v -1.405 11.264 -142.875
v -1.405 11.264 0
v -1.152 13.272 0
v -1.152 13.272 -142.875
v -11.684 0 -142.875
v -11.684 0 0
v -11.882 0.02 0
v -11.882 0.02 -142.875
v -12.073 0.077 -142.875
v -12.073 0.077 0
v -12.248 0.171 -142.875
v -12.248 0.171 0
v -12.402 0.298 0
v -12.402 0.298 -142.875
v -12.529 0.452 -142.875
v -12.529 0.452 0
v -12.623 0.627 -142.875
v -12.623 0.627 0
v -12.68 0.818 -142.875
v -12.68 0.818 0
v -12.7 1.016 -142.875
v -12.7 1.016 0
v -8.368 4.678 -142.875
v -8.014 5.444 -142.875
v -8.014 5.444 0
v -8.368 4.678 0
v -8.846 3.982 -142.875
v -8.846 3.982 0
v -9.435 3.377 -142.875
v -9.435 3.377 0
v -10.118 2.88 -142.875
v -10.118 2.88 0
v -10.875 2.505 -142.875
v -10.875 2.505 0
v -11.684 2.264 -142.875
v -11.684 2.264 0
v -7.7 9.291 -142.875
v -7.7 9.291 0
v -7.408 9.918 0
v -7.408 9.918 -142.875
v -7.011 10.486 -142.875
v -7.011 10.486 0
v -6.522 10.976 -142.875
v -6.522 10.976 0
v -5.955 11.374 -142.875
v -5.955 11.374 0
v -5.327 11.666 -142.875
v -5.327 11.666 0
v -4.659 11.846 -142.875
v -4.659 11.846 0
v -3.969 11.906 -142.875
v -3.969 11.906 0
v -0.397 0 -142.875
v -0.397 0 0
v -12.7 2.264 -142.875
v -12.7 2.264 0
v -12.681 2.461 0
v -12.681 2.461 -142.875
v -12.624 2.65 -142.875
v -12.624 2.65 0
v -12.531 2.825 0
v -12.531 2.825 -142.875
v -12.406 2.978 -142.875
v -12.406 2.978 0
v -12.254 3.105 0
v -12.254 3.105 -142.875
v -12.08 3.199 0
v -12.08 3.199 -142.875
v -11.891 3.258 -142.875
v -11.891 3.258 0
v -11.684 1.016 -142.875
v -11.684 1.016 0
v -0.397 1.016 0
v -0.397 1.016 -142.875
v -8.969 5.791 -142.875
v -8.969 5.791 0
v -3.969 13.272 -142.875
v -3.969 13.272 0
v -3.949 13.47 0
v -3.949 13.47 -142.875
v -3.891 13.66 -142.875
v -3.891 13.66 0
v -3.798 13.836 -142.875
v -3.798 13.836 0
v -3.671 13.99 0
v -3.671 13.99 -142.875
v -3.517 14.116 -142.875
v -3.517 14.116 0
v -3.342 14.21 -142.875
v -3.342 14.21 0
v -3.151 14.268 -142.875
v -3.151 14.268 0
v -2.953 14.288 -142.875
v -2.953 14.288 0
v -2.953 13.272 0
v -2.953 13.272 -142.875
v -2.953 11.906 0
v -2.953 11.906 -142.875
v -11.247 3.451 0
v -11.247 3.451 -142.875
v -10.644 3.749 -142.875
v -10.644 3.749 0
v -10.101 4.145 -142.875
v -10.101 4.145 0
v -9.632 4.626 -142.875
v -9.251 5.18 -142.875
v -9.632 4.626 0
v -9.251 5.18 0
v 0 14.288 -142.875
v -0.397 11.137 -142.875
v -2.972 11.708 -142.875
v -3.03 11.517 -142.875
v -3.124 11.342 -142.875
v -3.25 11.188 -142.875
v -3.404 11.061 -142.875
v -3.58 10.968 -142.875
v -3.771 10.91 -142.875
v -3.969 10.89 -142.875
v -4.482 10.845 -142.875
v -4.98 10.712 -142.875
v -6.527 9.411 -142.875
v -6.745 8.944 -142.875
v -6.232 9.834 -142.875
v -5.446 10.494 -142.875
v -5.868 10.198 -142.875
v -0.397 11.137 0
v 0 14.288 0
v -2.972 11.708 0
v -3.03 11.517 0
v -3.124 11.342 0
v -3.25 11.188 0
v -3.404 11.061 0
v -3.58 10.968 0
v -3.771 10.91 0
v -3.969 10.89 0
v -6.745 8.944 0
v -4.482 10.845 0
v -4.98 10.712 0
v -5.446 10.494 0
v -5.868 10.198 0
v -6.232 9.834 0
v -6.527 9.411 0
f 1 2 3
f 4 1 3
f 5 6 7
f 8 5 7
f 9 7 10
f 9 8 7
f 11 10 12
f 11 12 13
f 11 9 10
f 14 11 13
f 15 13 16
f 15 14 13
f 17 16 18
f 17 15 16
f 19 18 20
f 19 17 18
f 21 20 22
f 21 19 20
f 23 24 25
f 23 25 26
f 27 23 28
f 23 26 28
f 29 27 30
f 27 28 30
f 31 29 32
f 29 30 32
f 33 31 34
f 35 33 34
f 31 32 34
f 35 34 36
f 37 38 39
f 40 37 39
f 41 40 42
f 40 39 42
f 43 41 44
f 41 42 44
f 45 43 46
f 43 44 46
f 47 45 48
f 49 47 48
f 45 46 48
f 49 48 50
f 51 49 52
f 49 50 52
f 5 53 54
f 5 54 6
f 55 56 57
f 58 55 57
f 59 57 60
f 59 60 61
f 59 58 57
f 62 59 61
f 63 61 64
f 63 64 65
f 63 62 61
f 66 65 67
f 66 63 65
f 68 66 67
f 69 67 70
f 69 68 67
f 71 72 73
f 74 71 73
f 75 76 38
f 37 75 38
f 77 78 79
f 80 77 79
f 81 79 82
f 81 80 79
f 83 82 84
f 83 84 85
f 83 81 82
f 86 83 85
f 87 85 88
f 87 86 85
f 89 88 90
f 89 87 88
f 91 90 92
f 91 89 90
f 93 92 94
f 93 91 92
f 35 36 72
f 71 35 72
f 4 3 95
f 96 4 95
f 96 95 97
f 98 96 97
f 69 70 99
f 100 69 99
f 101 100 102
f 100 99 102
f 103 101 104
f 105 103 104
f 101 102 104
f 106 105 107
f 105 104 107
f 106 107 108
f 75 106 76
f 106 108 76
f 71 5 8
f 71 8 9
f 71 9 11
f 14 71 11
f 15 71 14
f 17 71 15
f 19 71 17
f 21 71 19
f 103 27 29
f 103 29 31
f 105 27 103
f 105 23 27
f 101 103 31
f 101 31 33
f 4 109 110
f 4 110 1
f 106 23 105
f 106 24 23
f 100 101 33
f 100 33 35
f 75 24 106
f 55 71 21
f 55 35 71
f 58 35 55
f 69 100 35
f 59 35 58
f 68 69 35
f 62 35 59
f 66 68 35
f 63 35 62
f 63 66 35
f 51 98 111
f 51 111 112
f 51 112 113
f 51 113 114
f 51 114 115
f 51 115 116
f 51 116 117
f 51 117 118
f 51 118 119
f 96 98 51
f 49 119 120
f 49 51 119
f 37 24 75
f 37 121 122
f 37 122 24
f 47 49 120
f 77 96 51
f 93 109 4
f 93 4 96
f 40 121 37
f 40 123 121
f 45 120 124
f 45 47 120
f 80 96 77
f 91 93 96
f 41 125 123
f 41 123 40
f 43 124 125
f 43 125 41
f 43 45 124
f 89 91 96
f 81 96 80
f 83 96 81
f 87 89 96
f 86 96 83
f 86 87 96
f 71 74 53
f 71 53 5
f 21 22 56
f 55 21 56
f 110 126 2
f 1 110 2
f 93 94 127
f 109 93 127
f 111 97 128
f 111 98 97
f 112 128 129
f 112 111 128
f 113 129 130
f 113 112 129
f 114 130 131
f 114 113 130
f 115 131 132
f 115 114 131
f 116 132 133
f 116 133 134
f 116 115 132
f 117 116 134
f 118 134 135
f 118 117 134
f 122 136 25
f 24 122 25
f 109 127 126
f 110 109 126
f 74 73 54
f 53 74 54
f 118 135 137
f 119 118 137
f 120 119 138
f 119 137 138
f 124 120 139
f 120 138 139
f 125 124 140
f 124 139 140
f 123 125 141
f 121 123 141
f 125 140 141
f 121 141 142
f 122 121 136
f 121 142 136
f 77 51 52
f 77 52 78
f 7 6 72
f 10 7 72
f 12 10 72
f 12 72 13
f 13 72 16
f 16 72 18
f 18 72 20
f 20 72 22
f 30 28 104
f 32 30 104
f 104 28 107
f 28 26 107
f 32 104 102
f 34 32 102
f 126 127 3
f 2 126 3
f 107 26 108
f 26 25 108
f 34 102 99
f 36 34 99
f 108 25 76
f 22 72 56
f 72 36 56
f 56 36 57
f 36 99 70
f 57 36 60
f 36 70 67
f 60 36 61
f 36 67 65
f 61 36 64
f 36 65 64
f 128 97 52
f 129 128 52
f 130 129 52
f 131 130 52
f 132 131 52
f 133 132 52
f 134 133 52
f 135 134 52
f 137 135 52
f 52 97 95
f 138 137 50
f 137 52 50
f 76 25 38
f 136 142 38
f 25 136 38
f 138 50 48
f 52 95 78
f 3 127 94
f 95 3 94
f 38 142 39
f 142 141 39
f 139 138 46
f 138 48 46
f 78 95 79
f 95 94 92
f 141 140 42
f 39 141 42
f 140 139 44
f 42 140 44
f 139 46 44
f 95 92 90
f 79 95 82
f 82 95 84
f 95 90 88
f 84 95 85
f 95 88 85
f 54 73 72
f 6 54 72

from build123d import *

# Parameters (mm, degrees)
EXTRUDE_THIN1_DEPTH = 142.875
FILLET1_R           = 1.016


with BuildPart() as part:
    # Sketch1 → Extrude-Thin1 (new body)
    with BuildSketch(Plane.XY):
        with BuildLine():
            Line((-0.396875, 0), (-12.7, 0))
            Line((-12.7, 0), (-12.7, 3.175))
            ThreePointArc((-12.7, 3.175), (-10.421749313, 3.894049957), (-8.969036168, 5.790647844))
            Line((-8.969036168, 5.790647844), (-7.699713832, 9.290602156))
            ThreePointArc((-7.699713832, 9.290602156), (-6.247000687, 11.187200043), (-3.96875, 11.90625))
            Line((-3.96875, 11.90625), (-3.96875, 14.2875))
            Line((-3.96875, 14.2875), (0, 14.2875))
            Line((0, 14.2875), (-0.396875, 11.137402345))
            Line((-0.396875, 11.137402345), (-1.40490625, 11.264402345))
            Line((-1.40490625, 11.264402345), (-1.152035714, 13.2715))
            Line((-1.152035714, 13.2715), (-2.95275, 13.2715))
            Line((-2.95275, 13.2715), (-2.95275, 10.70994956))
            ThreePointArc((-2.95275, 10.70994956), (-5.215232033, 10.614254584), (-6.744587091, 8.944208004))
            Line((-6.744587091, 8.944208004), (-8.013909427, 5.444253692))
            ThreePointArc((-8.013909427, 5.444253692), (-9.435411883, 3.376762213), (-11.684, 2.263639698))
            Line((-11.684, 2.263639698), (-11.684, 1.016))
            Line((-11.684, 1.016), (-0.396875, 1.016))
            Line((-0.396875, 1.016), (-0.396875, 0))
        make_face()
    extrude(amount=-EXTRUDE_THIN1_DEPTH)

    # Fillet1
    fillet1_edges = [part.edges().sort_by_distance(p)[0] for p in [
        (-2.95275, 10.70994956, -71.4375),
        (-12.7, 0, -71.4375),
        (-12.7, 3.175, -71.4375),
        (-3.96875, 14.2875, -71.4375),
    ]]
    fillet(fillet1_edges, radius=FILLET1_R)


solid = part.part
